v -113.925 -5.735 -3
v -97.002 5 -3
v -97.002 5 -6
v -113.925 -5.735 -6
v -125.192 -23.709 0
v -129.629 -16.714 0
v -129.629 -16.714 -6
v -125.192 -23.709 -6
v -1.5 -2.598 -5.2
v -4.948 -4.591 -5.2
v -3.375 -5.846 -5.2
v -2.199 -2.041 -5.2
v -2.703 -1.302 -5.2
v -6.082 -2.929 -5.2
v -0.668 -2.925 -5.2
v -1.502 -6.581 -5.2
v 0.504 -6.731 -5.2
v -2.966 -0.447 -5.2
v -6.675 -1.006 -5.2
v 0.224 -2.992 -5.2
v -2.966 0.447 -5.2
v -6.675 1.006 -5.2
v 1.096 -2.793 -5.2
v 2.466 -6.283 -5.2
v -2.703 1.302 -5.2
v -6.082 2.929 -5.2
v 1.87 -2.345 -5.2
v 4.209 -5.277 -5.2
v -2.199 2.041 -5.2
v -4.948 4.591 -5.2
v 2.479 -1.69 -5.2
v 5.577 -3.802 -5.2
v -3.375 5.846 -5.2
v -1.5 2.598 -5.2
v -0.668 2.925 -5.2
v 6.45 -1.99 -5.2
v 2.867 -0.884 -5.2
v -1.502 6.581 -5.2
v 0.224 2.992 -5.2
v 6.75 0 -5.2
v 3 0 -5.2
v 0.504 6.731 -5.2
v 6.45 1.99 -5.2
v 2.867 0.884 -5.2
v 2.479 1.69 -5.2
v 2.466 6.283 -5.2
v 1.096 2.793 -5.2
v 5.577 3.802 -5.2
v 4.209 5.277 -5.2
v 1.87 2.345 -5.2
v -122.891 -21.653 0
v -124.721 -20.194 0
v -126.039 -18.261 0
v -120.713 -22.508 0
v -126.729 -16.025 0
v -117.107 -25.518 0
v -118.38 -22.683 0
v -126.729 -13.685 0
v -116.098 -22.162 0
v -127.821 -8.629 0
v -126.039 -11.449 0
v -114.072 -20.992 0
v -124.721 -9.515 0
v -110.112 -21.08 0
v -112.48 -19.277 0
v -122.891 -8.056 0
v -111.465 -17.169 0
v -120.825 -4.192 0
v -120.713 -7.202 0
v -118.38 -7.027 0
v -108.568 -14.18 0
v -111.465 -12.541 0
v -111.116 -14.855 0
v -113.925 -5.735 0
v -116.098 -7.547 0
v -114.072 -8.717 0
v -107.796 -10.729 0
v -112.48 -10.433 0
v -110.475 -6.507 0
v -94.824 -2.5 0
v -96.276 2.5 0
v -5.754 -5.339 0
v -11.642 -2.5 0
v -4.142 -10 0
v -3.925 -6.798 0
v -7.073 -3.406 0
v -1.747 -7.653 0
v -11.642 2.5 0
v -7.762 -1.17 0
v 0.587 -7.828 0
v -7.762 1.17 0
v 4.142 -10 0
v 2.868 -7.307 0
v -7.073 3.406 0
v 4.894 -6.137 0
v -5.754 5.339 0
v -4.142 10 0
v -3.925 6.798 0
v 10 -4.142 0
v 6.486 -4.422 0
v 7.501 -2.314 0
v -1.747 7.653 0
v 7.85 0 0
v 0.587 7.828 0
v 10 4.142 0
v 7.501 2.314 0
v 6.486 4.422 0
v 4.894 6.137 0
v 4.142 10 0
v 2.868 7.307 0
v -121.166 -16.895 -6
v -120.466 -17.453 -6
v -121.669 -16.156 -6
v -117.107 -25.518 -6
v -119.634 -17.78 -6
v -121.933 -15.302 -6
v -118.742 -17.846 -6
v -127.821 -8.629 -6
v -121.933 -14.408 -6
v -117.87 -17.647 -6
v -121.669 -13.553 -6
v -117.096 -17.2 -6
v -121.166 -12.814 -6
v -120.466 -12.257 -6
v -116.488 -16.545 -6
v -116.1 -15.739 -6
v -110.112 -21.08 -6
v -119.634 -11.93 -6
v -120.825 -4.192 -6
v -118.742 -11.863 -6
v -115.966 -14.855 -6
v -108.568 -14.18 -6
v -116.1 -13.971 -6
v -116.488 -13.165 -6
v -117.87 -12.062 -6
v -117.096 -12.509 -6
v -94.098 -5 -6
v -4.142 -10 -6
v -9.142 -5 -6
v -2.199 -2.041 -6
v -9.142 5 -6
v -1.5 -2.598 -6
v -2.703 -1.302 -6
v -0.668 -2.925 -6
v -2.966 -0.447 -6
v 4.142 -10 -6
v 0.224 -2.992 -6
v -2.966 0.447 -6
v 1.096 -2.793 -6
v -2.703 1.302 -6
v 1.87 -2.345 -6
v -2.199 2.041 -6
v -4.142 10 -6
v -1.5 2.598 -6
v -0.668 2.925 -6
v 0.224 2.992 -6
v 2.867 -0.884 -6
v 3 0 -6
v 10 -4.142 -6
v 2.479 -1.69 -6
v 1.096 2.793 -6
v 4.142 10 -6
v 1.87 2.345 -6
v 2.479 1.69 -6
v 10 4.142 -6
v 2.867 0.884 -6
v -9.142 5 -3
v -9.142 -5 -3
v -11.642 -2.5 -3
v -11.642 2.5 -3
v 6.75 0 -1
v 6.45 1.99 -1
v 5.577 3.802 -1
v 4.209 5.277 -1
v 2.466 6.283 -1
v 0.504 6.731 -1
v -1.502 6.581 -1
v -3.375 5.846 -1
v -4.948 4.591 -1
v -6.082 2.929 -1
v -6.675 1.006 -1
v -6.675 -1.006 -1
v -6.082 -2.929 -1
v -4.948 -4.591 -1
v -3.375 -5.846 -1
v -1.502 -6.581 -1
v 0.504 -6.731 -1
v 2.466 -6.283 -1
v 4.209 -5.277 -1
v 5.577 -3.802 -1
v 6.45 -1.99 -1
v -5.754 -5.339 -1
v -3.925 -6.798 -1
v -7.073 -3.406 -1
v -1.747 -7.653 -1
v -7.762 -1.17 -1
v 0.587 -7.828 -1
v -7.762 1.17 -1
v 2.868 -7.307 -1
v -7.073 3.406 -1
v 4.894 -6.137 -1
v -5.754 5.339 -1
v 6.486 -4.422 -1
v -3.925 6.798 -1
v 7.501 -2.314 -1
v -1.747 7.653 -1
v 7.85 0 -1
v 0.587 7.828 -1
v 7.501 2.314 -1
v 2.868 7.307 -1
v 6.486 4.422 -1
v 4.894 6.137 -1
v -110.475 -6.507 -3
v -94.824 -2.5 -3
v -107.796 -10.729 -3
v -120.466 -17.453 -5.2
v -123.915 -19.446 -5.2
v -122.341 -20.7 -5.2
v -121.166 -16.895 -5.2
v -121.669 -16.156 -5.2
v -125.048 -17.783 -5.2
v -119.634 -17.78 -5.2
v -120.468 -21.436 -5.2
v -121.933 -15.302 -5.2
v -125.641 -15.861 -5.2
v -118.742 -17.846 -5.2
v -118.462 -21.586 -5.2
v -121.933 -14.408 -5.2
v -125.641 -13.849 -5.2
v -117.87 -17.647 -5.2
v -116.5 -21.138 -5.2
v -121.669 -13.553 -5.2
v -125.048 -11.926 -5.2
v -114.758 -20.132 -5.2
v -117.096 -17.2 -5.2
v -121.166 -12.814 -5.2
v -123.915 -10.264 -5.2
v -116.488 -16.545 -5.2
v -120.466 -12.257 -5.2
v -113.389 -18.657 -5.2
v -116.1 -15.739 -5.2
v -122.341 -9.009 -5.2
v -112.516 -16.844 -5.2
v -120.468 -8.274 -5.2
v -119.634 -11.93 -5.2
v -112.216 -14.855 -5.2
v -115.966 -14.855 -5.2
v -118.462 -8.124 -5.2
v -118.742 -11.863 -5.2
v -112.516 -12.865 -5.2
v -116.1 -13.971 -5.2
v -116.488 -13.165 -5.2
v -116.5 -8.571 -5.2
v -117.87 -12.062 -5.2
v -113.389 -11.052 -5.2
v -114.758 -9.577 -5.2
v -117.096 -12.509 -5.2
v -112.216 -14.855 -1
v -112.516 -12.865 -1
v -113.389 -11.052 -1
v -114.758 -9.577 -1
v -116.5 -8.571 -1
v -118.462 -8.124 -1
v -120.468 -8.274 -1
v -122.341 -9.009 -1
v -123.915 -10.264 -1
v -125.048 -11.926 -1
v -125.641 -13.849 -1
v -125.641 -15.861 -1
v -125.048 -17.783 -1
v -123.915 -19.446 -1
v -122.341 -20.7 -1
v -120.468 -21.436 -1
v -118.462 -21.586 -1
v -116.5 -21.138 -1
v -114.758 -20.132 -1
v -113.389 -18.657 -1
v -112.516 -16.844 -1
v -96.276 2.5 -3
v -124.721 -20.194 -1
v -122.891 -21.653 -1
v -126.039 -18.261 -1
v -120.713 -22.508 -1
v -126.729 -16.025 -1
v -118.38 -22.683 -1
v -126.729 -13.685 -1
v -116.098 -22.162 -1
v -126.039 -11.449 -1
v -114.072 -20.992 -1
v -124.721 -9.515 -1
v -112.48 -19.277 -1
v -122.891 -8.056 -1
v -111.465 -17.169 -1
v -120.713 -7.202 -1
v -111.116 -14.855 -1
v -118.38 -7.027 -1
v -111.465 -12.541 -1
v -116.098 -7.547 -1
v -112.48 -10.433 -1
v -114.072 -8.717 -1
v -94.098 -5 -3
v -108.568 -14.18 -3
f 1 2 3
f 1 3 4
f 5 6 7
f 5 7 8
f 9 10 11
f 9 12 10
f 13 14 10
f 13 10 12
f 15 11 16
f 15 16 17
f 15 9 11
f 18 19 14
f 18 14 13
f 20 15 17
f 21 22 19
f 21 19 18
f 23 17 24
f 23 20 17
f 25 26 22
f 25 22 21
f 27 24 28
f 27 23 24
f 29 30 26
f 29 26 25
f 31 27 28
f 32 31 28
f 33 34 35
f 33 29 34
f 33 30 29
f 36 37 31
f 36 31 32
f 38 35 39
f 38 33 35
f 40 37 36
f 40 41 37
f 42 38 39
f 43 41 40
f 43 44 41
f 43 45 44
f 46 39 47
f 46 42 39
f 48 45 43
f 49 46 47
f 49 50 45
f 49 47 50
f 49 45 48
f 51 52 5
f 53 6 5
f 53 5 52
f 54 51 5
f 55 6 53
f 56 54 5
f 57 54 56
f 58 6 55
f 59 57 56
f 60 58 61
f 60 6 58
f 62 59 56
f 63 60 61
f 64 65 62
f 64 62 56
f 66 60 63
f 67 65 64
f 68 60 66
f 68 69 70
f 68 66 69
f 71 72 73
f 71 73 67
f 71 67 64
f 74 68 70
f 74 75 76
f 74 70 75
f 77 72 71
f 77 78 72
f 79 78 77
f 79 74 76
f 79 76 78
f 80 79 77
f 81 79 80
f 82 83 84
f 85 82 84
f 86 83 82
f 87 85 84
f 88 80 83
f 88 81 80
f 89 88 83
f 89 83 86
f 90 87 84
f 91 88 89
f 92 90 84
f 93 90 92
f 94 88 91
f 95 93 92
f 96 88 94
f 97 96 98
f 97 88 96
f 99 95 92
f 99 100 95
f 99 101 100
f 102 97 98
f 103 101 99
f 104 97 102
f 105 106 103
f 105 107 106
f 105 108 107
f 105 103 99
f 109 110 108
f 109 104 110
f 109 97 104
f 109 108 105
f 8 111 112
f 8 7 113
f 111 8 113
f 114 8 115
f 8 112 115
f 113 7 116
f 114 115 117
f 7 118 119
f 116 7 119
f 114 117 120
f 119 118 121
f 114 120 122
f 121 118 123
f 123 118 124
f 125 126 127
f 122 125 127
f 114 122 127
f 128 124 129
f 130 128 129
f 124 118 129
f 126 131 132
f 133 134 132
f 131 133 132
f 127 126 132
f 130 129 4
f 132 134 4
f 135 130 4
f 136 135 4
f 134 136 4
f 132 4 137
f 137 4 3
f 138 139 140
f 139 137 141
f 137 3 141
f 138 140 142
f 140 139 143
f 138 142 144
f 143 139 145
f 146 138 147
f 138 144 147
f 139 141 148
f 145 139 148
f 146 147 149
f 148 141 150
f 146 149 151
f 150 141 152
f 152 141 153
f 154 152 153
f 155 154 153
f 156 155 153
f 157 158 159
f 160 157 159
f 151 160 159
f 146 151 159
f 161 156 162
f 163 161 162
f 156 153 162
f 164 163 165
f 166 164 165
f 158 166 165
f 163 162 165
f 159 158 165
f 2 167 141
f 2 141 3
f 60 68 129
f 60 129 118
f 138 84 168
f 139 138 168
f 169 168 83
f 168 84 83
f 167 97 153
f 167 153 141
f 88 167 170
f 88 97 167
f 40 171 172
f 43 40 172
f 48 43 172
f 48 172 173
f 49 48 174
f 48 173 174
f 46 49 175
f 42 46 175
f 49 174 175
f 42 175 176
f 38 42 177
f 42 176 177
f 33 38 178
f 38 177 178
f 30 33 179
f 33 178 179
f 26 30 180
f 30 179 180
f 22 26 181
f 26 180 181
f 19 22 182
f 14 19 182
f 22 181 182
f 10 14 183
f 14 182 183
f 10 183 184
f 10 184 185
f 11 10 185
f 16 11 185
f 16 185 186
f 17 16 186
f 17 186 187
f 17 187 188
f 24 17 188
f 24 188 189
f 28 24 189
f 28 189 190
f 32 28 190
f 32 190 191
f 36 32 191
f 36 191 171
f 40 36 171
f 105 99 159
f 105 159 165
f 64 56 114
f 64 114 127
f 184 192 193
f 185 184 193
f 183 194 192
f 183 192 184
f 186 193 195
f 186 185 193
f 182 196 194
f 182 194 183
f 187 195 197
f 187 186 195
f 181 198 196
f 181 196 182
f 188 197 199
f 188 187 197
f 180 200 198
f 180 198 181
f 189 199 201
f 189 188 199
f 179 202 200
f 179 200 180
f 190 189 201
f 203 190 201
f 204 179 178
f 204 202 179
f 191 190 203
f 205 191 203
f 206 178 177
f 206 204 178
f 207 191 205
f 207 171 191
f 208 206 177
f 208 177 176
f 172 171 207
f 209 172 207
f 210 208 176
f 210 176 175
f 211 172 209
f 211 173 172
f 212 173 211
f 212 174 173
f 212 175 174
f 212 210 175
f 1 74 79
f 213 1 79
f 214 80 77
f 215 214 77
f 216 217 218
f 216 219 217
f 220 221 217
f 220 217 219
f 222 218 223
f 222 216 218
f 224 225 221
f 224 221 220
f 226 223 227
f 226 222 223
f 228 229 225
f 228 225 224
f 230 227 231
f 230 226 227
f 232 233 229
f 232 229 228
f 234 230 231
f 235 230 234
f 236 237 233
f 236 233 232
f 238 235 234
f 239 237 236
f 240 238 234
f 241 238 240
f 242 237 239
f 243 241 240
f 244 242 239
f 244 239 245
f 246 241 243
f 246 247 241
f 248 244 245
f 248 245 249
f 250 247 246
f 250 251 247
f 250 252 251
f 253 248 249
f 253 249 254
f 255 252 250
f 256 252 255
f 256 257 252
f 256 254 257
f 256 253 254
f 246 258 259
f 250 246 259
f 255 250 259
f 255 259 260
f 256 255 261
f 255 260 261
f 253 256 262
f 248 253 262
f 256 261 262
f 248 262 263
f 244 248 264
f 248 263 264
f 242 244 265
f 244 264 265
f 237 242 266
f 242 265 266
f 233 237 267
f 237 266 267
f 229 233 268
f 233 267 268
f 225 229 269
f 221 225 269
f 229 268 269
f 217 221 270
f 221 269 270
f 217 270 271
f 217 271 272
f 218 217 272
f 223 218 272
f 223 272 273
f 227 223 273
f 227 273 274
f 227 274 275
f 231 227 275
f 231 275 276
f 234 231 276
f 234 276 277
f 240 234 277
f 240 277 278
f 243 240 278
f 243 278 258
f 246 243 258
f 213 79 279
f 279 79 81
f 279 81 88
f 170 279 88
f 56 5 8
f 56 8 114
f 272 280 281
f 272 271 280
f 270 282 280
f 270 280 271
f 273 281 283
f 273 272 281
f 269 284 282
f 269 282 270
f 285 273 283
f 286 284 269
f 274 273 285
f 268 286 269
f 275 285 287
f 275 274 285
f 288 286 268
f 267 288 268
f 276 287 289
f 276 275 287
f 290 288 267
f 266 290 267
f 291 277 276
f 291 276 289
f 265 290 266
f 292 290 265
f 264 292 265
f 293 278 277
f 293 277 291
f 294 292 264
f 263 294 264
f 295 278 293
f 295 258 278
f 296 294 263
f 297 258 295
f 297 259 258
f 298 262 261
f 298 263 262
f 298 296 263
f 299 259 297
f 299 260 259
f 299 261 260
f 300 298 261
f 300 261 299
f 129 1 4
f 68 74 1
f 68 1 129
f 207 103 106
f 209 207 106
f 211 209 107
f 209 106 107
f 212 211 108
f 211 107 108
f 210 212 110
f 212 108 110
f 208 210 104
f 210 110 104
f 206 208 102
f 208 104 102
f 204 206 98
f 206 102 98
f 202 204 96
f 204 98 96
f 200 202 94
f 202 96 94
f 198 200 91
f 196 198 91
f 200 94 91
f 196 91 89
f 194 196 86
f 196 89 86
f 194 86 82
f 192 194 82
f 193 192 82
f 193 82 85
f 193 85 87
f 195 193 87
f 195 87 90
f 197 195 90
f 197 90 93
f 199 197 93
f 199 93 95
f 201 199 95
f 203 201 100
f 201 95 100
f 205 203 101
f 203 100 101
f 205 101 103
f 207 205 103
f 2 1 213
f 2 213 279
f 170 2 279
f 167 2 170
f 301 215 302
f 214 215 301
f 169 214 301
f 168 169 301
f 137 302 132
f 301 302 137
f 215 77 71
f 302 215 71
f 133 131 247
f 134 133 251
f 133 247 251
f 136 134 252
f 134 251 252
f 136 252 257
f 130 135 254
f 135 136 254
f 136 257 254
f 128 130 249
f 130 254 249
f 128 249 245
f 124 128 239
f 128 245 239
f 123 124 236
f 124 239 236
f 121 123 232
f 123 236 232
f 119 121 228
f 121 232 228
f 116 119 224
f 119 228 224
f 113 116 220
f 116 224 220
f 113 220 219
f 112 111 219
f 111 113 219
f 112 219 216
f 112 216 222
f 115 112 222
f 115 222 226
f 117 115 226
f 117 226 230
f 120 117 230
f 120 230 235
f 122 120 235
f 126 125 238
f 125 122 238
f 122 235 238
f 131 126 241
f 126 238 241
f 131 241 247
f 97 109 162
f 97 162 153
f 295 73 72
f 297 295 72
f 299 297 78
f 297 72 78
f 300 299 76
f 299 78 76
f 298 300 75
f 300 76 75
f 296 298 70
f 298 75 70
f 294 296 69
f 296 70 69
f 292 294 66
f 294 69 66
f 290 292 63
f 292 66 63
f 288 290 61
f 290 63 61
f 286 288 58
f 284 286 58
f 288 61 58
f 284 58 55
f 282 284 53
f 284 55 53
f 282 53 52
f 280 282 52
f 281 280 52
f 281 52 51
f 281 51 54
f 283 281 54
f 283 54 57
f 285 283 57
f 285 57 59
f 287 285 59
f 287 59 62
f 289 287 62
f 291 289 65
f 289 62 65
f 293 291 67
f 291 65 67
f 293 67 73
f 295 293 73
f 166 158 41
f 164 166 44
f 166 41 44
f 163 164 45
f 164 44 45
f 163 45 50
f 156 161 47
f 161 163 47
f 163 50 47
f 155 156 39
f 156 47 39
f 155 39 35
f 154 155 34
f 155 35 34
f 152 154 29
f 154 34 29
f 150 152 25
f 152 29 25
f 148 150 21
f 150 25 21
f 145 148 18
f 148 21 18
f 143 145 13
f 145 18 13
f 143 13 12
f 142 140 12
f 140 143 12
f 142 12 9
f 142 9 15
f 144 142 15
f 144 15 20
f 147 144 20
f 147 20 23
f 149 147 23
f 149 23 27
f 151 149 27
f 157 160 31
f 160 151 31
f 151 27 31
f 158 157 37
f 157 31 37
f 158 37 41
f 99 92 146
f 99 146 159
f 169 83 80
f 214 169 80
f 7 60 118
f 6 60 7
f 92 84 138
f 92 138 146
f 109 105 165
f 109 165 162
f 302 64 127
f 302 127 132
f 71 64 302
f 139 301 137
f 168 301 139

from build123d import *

# Parameters (mm, degrees)
SKETCH1_R           = 3
BOSS_EXTRUDE1_DEPTH = 6
BOSS_EXTRUDE2_DEPTH = 3
SKETCH3_R           = 7.85
CUT_EXTRUDE1_DEPTH  = 1
SKETCH4_R           = 6.75
CUT_EXTRUDE2_DEPTH  = 5.2
SKETCH5_W           = 10.298947731
SKETCH5_H           = 6.677630872
BOSS_EXTRUDE3_DEPTH = 0.8
SKETCH6_R           = 3
CUT_EXTRUDE3_DEPTH  = 0.8
BOSS_EXTRUDE5_START = -6
SKETCH7_R           = 9.071835919
SKETCH7_R_2         = 3
SKETCH7_R_3         = 8.53010645
BOSS_EXTRUDE5_DEPTH = 6
SKETCH8_R           = 7.85
CUT_EXTRUDE4_DEPTH  = 1
SKETCH9_R           = 6.75
CUT_EXTRUDE5_DEPTH  = 5.2
BOSS_EXTRUDE6_DEPTH = 3
CUT_EXTRUDE10_DEPTH = 3


with BuildPart() as part:
    # Sketch1 → Boss-Extrude1 (new body)
    with BuildSketch(Plane.XY):
        Polygon((4.142135624, 10), (-4.142135624, 10), (-11.642135624, 2.5), (-96.276080567, 2.5), (-110.474741511, -6.507268438), (-120.82549793, -4.191703376), (-127.82091412, -8.629417024), (-129.629482932, -16.713860663), (-125.191769284, -23.709276854), (-117.107325644, -25.517845665), (-110.111909454, -21.080132017), (-107.796344392, -10.729375598), (-94.823919433, -2.5), (-11.642135624, -2.5), (-4.142135624, -10), (4.142135624, -10), (10, -4.142135624), (10, 4.142135624), align=None)
        with Locations((-118.966411787, -14.85477452)):
            Circle(SKETCH1_R, mode=Mode.SUBTRACT)
        with Locations((-0.876614201, 0)):
            Circle(SKETCH1_R, mode=Mode.SUBTRACT)
    extrude(amount=-BOSS_EXTRUDE1_DEPTH)

    # Sketch2 → Boss-Extrude2 (add)
    with BuildSketch(Plane.XY):
        Polygon((-113.924993651, -5.735413417), (-110.474741511, -6.507268438), (-96.276080567, 2.5), (-11.642135624, 2.5), (-9.142135624, 5), (-97.002161134, 5), align=None)
        Polygon((-108.568199413, -14.179627738), (-107.796344392, -10.729375598), (-94.823919433, -2.5), (-11.642135624, -2.5), (-9.142135624, -5), (-94.097838866, -5), align=None)
    extrude(amount=-BOSS_EXTRUDE2_DEPTH)

    # Sketch3 → Cut-Extrude1 (cut)
    with BuildSketch(Plane(origin=(0, 0, -6), x_dir=(-1, 0, 0), z_dir=(0, 0, -1))):
        Circle(SKETCH3_R)
        with Locations((118.966411787, -14.85477452)):
            Circle(SKETCH3_R)
    extrude(amount=-CUT_EXTRUDE1_DEPTH, mode=Mode.SUBTRACT)

    # Sketch4 → Cut-Extrude2 (cut)
    with BuildSketch(Plane(origin=(0, 0, -6), x_dir=(-1, 0, 0), z_dir=(0, 0, -1))):
        Circle(SKETCH4_R)
        with Locations((118.966411787, -14.85477452)):
            Circle(SKETCH4_R)
    extrude(amount=-CUT_EXTRUDE2_DEPTH, mode=Mode.SUBTRACT)

    # Sketch5 → Boss-Extrude3 (add)
    with BuildSketch(Plane.XY):
        with Locations((-0.876614202, 0)):
            Rectangle(SKETCH5_W, SKETCH5_H)
    extrude(amount=-BOSS_EXTRUDE3_DEPTH)

    # Sketch6 → Cut-Extrude3 (cut)
    with BuildSketch(Plane.XY):
        Circle(SKETCH6_R)
    extrude(amount=-CUT_EXTRUDE3_DEPTH, mode=Mode.SUBTRACT)

    # Sketch7 → Boss-Extrude5 (add)
    # profile 1 of 2: a face of its own
    with BuildSketch(Plane(origin=(0, 0, -6), x_dir=(-1, 0, 0), z_dir=(0, 0, -1)).offset(BOSS_EXTRUDE5_START)):
        Circle(SKETCH7_R)
        with Locations(Location((0, 0, 0), (0, 0, 180))):
            Circle(SKETCH7_R_2, mode=Mode.SUBTRACT)
    # profile 2 of 2: a face of its own
    with BuildSketch(Plane(origin=(0, 0, -6), x_dir=(-1, 0, 0), z_dir=(0, 0, -1)).offset(BOSS_EXTRUDE5_START)):
        with Locations((118.966411787, -14.85477452)):
            Circle(SKETCH7_R_3)
        with Locations(Location((118.966411787, -14.85477452, 0), (0, 0, 180))):
            Circle(SKETCH7_R_2, mode=Mode.SUBTRACT)
    extrude(amount=BOSS_EXTRUDE5_DEPTH)

    # Sketch8 → Cut-Extrude4 (cut)
    with BuildSketch(Plane.XY):
        with Locations((-118.966411787, -14.85477452)):
            Circle(SKETCH8_R)
        Circle(SKETCH8_R)
    extrude(amount=-CUT_EXTRUDE4_DEPTH, mode=Mode.SUBTRACT)

    # Sketch9 → Cut-Extrude5 (cut)
    with BuildSketch(Plane.XY):
        with Locations((-118.966411787, -14.85477452)):
            Circle(SKETCH9_R)
        Circle(SKETCH9_R)
    extrude(amount=-CUT_EXTRUDE5_DEPTH, mode=Mode.SUBTRACT)

    # Sketch10 → Boss-Extrude6 (add)
    with BuildSketch(Plane(origin=(0, 0, -3), x_dir=(-1, 0, 0), z_dir=(0, 0, -1))):
        Polygon((9.142135624, -5), (11.642135624, -2.5), (94.823919433, -2.5), (107.796344392, -10.729375598), (108.568199413, -14.179627738), (94.097838866, -5), align=None)
        Polygon((9.142135624, 5), (11.642135624, 2.5), (96.276080567, 2.5), (110.474741511, -6.507268438), (113.924993651, -5.735413417), (97.002161134, 5), align=None)
    extrude(amount=BOSS_EXTRUDE6_DEPTH)

    # Sketch11 → Cut-Extrude10 (cut)
    with BuildSketch(Plane.XY):
        Polygon((-9.142135624, 5), (-97.002161134, 5), (-113.924993651, -5.735413417), (-110.474741511, -6.507268438), (-96.276080567, 2.5), (-11.642135624, 2.5), align=None)
        Polygon((-11.642135624, -2.5), (-94.823919433, -2.5), (-107.796344392, -10.729375598), (-108.568199413, -14.179627738), (-94.097838866, -5), (-9.142135624, -5), align=None)
    extrude(amount=-CUT_EXTRUDE10_DEPTH, mode=Mode.SUBTRACT)


solid = part.part
